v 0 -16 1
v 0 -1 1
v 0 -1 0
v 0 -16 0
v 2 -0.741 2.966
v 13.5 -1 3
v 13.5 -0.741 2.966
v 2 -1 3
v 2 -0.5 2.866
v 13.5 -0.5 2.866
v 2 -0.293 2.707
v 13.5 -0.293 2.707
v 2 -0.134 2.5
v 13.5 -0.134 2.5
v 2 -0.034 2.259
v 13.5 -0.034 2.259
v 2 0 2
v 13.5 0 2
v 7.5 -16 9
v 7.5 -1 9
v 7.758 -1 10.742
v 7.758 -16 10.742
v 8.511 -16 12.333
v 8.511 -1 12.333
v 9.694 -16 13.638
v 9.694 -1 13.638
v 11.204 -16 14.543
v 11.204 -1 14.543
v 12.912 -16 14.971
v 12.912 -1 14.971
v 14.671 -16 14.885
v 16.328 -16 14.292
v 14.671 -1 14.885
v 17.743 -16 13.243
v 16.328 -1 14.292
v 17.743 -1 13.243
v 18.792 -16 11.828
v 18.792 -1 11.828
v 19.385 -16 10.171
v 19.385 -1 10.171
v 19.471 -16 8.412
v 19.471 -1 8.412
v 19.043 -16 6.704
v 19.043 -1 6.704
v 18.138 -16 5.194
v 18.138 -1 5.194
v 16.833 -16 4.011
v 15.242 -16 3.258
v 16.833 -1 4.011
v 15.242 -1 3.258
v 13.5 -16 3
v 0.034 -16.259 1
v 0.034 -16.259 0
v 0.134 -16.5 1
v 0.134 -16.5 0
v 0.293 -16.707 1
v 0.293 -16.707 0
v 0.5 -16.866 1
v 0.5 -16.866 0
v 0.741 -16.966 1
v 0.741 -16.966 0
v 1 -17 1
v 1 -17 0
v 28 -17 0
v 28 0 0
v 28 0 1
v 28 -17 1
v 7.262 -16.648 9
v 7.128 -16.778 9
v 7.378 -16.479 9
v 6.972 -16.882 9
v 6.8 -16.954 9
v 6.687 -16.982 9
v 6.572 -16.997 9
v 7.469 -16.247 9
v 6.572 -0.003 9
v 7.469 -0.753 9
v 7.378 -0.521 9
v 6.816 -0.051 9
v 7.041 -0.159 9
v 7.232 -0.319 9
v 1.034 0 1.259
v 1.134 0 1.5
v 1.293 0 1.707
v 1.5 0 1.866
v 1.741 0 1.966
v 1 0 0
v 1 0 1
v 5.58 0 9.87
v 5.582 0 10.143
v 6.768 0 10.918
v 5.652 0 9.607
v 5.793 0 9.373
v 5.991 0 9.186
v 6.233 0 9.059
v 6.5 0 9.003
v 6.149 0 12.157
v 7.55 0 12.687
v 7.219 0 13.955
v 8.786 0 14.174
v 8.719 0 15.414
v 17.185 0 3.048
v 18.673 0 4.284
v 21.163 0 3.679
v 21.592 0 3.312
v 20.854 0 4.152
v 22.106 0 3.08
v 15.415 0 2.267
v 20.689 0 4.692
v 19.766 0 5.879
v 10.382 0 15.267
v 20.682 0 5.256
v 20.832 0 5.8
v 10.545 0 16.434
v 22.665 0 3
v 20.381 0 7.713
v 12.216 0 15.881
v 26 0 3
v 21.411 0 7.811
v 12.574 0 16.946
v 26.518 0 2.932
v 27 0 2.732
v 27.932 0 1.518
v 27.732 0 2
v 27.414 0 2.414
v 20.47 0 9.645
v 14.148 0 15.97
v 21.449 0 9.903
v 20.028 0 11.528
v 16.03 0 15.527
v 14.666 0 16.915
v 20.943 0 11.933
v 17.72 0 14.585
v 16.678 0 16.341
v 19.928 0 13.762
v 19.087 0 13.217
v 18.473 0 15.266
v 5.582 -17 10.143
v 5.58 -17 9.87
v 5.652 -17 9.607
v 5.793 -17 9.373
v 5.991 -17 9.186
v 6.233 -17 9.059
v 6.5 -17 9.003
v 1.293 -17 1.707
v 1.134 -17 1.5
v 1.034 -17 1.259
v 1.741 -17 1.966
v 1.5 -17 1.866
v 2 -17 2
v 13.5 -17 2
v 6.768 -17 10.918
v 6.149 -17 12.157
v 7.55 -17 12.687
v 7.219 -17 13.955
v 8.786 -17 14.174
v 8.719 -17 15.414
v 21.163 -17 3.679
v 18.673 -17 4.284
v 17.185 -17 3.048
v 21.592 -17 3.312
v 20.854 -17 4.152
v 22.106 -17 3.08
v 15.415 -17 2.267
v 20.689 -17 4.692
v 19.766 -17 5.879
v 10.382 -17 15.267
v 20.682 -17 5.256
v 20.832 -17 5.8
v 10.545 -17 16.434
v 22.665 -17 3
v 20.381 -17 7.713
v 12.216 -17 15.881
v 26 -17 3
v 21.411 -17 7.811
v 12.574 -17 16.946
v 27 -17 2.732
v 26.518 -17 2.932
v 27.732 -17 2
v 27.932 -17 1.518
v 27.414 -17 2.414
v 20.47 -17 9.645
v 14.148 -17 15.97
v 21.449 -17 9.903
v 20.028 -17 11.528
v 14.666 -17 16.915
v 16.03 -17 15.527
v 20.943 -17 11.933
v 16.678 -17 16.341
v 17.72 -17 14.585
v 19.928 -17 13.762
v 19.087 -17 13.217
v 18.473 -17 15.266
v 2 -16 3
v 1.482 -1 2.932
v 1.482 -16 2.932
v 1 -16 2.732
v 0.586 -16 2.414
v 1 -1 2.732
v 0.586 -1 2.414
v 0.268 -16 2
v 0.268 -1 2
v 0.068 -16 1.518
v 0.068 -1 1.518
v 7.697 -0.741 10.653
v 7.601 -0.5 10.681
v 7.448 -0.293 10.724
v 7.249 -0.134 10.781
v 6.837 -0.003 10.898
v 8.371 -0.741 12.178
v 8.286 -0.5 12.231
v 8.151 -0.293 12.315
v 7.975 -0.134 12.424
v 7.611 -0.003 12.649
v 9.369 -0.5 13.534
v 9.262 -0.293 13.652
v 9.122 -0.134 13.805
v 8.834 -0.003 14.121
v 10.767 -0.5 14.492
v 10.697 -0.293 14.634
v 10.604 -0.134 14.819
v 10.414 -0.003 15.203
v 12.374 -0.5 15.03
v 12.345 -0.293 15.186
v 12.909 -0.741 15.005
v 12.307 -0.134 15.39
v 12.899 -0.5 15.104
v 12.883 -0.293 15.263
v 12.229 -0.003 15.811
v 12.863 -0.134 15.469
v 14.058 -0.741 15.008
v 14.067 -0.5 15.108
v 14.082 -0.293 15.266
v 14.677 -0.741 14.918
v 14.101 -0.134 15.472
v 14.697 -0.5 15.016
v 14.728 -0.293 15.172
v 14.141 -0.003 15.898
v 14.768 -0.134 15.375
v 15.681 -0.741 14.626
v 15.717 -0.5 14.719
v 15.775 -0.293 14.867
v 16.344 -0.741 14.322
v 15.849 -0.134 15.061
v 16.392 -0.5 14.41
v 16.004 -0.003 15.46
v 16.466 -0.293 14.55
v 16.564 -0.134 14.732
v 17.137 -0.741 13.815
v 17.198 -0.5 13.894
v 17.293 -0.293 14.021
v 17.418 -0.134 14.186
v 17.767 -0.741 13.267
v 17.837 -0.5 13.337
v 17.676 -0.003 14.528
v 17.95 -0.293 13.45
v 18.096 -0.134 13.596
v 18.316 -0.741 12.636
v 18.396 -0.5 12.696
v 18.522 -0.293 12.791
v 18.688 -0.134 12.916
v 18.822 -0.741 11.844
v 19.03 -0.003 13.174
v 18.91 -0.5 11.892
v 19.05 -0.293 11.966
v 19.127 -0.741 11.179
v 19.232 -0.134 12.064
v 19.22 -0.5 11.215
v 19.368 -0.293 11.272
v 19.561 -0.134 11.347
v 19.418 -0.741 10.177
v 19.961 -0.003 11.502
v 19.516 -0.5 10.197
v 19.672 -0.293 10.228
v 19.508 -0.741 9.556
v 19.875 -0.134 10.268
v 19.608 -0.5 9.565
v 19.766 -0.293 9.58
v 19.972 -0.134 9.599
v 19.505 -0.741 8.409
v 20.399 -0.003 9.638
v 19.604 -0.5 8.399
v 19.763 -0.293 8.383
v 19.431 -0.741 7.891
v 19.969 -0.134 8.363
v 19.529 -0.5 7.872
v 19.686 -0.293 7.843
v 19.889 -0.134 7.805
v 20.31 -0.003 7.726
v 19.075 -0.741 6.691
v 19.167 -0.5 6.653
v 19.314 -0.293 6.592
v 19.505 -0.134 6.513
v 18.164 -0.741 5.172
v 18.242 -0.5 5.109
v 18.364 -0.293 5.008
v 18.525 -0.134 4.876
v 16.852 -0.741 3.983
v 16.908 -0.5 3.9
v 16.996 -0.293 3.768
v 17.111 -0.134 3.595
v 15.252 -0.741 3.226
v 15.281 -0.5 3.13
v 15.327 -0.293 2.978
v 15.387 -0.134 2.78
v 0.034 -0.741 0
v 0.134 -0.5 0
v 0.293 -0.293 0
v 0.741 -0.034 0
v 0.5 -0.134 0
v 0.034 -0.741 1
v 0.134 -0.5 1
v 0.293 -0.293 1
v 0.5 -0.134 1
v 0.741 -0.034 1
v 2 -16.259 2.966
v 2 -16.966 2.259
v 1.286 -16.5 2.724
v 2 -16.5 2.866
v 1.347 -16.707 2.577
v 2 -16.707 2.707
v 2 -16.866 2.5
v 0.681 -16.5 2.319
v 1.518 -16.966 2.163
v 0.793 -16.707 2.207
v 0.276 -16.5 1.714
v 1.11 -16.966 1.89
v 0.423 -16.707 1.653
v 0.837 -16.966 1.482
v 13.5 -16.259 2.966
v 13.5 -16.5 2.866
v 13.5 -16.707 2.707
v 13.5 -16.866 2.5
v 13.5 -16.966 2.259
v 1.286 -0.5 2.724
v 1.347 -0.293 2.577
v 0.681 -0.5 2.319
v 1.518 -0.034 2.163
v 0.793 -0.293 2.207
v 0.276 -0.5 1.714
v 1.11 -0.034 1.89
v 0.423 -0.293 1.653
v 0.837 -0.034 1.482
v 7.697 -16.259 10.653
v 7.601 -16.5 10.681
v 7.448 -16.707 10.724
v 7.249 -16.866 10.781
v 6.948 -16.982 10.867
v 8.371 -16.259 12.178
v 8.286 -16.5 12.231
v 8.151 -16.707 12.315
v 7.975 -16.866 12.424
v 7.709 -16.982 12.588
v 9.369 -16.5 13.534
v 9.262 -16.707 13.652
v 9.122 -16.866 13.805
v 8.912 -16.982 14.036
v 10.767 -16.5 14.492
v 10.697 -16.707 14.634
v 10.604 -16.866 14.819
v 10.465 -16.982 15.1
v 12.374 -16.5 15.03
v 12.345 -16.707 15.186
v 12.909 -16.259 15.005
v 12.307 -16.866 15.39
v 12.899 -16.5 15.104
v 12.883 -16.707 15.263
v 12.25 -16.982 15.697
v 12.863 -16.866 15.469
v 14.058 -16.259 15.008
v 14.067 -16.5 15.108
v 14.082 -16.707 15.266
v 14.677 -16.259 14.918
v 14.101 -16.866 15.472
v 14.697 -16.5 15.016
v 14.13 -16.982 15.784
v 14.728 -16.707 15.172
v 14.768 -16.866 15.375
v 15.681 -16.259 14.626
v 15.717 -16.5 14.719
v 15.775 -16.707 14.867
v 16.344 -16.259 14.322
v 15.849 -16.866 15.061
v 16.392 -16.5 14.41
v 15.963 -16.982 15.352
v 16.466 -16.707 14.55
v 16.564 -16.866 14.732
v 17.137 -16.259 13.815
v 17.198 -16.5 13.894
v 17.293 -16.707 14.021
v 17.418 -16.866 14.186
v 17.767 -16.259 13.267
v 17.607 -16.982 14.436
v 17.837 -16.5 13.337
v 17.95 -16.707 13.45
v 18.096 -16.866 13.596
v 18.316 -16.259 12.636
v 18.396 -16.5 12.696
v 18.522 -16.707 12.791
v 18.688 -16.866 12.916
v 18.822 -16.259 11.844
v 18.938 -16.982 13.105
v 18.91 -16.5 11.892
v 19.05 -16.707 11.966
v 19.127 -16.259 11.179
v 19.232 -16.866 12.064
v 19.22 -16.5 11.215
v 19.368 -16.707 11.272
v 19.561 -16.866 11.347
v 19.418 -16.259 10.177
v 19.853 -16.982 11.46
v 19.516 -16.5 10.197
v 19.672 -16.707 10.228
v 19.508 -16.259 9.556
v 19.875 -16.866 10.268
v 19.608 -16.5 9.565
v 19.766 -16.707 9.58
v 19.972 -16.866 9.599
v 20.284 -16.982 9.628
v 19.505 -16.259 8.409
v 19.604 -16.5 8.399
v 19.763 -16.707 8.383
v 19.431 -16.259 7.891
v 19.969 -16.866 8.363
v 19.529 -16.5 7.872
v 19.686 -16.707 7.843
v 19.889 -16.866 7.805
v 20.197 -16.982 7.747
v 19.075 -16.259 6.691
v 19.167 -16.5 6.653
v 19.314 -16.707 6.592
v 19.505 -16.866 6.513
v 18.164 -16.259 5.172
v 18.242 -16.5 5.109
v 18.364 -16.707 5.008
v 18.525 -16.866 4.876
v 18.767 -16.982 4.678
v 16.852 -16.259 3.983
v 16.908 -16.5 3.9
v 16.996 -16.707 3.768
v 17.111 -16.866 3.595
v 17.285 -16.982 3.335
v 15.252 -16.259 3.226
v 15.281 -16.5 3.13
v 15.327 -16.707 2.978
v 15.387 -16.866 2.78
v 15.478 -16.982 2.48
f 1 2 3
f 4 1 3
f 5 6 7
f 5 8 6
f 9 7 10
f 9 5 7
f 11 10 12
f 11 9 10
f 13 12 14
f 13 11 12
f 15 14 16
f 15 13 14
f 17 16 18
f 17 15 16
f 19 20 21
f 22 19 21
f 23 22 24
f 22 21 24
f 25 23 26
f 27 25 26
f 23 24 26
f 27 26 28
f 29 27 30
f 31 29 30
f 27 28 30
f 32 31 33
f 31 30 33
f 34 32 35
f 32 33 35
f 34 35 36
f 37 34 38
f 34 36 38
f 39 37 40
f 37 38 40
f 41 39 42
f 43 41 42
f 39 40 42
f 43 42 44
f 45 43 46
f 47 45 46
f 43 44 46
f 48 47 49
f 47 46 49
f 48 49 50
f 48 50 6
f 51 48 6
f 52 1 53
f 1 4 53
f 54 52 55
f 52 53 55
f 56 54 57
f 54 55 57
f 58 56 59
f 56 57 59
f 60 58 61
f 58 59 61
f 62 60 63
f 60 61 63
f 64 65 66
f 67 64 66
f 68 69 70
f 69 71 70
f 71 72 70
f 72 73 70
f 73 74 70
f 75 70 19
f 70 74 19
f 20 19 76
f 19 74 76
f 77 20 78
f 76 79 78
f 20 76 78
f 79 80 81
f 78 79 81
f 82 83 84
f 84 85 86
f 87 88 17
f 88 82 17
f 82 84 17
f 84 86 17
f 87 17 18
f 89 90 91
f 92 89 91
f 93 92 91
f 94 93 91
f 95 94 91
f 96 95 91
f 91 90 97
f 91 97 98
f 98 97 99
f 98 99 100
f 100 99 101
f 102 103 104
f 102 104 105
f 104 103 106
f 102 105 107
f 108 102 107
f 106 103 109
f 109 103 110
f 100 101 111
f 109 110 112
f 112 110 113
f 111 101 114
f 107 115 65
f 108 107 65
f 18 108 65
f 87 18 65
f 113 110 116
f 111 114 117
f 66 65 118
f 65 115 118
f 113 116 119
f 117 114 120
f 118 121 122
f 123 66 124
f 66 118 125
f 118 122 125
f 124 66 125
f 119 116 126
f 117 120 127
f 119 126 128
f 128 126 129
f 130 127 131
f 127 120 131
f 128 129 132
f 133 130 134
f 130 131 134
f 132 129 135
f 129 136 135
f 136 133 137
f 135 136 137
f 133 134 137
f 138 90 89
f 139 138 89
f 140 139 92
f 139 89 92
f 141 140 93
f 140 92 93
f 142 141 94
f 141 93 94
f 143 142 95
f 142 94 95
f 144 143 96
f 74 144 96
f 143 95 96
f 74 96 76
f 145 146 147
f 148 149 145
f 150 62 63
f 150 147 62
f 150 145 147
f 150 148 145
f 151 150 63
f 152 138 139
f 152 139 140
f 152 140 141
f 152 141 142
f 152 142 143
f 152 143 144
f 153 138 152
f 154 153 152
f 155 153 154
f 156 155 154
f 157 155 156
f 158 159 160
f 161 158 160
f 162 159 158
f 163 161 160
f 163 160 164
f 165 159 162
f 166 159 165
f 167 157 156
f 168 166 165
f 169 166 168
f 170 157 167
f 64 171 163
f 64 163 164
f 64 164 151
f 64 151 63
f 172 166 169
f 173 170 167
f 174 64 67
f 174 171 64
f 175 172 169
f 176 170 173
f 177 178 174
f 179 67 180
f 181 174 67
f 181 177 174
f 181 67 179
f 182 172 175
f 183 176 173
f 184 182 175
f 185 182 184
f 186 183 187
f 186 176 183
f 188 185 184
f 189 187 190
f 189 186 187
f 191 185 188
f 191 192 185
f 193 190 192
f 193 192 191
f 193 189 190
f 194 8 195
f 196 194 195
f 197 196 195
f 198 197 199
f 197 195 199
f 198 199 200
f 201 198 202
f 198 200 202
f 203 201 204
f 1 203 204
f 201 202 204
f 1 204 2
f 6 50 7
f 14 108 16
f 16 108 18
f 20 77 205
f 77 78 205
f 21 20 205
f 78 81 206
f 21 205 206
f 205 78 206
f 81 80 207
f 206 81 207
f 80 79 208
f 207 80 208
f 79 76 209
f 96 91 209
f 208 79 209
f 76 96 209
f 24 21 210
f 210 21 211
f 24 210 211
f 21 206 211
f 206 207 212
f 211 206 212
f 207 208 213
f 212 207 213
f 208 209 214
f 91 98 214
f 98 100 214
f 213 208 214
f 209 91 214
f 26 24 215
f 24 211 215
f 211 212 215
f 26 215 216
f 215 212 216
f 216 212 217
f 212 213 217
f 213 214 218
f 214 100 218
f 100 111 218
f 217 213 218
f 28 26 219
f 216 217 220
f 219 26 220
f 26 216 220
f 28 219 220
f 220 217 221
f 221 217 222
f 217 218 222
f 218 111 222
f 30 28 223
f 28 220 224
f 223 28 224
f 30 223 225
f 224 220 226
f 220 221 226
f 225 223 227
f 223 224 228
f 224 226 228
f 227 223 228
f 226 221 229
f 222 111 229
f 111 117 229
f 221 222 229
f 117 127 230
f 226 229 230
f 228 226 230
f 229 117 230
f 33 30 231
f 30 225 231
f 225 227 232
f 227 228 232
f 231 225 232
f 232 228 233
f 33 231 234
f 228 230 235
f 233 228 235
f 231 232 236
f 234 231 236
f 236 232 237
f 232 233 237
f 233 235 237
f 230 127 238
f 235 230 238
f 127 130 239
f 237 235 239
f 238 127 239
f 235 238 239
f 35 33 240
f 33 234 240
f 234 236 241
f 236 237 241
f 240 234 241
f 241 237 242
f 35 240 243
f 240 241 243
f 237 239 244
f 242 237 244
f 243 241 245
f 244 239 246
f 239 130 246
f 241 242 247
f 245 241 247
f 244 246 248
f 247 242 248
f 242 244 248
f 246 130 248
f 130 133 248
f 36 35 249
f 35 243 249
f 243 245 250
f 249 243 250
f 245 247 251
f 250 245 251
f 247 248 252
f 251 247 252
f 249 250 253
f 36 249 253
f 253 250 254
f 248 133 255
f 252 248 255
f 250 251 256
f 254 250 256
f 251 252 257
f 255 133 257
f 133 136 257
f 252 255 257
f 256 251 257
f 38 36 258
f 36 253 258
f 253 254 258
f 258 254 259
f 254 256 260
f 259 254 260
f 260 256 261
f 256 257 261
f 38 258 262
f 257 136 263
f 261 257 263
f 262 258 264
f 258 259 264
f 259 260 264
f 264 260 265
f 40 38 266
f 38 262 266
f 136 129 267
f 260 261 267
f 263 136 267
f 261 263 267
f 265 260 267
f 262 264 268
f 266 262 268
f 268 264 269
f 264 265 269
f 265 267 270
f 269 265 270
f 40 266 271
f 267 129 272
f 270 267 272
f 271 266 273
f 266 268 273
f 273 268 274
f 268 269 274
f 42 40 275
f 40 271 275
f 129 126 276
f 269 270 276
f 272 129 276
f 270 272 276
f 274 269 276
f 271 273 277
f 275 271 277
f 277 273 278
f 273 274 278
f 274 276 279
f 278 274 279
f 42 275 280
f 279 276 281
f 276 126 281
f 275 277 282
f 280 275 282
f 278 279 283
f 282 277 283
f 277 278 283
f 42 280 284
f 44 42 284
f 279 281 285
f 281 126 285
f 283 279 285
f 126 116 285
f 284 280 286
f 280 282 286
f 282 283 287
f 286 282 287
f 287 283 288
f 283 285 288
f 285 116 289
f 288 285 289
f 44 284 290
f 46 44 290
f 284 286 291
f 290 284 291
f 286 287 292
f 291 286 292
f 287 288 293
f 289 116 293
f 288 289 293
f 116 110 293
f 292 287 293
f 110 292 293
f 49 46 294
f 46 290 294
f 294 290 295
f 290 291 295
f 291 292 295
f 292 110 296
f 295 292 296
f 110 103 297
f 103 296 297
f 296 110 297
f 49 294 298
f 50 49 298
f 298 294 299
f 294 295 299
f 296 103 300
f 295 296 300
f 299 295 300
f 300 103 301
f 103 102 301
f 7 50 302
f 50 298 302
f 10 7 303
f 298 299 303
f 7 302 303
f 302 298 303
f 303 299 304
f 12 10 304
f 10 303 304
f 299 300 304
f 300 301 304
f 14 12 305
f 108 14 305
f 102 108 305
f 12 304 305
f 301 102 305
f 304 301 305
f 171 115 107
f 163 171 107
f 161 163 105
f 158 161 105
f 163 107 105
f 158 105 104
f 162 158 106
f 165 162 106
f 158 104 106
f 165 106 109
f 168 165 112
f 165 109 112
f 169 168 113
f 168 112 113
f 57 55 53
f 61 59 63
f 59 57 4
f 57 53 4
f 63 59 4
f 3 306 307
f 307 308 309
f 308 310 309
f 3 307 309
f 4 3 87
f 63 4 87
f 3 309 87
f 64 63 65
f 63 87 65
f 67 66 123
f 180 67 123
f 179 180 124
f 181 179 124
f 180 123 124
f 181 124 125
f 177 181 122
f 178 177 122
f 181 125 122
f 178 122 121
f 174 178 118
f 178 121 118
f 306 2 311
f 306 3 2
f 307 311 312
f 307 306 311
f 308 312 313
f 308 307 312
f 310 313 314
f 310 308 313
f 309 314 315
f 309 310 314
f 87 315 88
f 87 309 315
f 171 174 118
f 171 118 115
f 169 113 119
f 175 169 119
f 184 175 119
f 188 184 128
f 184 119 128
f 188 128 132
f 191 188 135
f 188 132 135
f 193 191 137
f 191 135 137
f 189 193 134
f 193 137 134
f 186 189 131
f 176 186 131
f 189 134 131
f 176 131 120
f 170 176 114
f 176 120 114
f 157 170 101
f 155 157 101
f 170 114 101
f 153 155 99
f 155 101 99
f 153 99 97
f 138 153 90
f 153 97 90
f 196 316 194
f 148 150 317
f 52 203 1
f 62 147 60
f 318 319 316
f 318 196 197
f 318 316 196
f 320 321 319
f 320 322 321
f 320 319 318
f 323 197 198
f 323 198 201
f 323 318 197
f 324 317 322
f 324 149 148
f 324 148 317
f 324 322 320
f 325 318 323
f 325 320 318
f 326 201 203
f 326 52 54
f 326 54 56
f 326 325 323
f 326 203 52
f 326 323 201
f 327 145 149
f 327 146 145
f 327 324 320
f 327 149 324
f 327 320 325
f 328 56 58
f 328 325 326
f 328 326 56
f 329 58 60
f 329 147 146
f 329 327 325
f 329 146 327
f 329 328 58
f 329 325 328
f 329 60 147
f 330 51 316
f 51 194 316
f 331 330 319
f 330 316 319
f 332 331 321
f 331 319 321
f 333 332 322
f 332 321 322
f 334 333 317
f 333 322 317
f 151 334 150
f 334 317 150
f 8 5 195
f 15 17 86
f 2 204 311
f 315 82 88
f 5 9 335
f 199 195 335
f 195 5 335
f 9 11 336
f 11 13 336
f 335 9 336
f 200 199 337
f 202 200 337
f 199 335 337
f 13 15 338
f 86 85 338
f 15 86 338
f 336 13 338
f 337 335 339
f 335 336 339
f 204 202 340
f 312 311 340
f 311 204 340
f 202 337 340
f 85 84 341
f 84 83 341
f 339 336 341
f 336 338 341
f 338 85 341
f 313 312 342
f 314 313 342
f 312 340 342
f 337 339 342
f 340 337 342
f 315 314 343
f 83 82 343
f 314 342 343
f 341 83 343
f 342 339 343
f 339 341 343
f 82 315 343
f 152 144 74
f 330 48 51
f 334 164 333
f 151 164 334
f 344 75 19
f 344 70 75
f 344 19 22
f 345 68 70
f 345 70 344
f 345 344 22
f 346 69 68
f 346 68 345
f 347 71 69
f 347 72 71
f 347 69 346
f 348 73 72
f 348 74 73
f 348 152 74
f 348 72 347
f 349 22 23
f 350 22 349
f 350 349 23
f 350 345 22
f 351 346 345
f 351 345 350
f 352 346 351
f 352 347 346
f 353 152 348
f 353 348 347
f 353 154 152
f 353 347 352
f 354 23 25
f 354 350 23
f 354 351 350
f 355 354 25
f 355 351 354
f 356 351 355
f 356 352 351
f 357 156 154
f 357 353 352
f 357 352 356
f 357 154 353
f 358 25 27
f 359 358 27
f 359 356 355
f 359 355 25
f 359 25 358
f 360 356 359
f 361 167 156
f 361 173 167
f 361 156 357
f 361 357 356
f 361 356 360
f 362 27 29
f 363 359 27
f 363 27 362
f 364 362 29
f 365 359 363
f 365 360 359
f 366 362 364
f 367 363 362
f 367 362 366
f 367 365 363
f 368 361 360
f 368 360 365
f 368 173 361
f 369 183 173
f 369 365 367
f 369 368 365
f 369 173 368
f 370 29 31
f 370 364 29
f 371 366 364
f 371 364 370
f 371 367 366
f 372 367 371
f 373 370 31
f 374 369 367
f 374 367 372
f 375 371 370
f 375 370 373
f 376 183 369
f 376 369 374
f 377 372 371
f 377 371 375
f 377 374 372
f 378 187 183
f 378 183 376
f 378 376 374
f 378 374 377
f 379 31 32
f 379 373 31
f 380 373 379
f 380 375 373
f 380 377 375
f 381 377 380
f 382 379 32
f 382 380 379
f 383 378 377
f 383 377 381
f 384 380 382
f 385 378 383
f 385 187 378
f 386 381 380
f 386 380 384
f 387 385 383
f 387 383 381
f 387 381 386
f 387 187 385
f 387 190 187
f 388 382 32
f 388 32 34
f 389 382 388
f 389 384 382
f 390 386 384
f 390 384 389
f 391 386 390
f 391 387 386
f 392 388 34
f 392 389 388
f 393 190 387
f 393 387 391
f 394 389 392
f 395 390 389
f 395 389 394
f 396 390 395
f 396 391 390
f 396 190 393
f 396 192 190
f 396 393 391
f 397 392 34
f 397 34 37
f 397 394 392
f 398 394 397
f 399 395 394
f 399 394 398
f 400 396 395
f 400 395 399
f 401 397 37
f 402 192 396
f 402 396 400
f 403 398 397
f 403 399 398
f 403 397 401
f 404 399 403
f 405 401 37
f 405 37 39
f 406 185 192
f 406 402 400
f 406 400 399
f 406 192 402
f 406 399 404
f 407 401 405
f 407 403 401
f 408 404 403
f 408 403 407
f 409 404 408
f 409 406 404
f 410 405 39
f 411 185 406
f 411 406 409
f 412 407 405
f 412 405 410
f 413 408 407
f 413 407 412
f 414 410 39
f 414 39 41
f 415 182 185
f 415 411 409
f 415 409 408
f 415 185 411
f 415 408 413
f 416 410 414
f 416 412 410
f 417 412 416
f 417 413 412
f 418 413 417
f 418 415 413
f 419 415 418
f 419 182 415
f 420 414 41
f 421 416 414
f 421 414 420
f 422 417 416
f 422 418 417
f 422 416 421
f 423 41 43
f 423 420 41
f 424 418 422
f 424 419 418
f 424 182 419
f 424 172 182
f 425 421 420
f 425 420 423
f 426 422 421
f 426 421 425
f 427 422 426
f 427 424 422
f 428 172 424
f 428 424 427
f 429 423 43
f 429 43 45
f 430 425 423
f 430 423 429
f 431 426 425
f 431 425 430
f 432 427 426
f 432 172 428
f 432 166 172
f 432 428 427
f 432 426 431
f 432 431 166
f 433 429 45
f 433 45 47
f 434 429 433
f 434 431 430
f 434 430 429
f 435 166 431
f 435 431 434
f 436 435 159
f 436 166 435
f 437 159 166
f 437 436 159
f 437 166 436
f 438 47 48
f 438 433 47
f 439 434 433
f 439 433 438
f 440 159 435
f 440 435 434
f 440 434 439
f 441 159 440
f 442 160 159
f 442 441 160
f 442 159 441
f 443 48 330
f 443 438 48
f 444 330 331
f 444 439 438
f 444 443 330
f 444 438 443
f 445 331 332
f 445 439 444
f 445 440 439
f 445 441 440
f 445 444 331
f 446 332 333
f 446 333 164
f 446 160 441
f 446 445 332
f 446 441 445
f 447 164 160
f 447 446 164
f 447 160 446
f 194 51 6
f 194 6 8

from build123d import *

# Parameters (mm, degrees)
F1_DEPTH = 17
F2_R     = 1


with BuildPart() as f1:
    # F0 (on Front) → F1 (new body)
    with BuildSketch(Plane.XZ):
        with BuildLine():
            ThreePointArc((7.5, 9), (17.742641, 13.242641), (13.5, 3))
            Line((13.5, 3), (2, 3))
            ThreePointArc((2, 3), (0.585786, 2.414214), (0, 1))
            Line((0, 1), (0, 0))
            Line((0, 0), (28, 0))
            Line((28, 0), (28, 1))
            ThreePointArc((28, 1), (27.414214, 2.414214), (26, 3))
            Line((26, 3), (22.665151, 3))
            ThreePointArc((22.665151, 3), (20.991831, 3.904555), (20.832121, 5.8))
            ThreePointArc((20.832121, 5.8), (15.691096, 16.694095), (5.582053, 10.142857))
            ThreePointArc((5.582053, 10.142857), (5.815868, 9.345346), (6.571797, 9))
            Line((6.571797, 9), (7.5, 9))
        make_face()
    extrude(amount=F1_DEPTH)

    # F2
    f2_edges = [f1.edges().sort_by_distance(p)[0] for p in [
        (7.75, 0, 3),
        (17.742641, -17, 13.242641),
    ]]
    fillet(f2_edges, radius=F2_R)


solid = f1.part
